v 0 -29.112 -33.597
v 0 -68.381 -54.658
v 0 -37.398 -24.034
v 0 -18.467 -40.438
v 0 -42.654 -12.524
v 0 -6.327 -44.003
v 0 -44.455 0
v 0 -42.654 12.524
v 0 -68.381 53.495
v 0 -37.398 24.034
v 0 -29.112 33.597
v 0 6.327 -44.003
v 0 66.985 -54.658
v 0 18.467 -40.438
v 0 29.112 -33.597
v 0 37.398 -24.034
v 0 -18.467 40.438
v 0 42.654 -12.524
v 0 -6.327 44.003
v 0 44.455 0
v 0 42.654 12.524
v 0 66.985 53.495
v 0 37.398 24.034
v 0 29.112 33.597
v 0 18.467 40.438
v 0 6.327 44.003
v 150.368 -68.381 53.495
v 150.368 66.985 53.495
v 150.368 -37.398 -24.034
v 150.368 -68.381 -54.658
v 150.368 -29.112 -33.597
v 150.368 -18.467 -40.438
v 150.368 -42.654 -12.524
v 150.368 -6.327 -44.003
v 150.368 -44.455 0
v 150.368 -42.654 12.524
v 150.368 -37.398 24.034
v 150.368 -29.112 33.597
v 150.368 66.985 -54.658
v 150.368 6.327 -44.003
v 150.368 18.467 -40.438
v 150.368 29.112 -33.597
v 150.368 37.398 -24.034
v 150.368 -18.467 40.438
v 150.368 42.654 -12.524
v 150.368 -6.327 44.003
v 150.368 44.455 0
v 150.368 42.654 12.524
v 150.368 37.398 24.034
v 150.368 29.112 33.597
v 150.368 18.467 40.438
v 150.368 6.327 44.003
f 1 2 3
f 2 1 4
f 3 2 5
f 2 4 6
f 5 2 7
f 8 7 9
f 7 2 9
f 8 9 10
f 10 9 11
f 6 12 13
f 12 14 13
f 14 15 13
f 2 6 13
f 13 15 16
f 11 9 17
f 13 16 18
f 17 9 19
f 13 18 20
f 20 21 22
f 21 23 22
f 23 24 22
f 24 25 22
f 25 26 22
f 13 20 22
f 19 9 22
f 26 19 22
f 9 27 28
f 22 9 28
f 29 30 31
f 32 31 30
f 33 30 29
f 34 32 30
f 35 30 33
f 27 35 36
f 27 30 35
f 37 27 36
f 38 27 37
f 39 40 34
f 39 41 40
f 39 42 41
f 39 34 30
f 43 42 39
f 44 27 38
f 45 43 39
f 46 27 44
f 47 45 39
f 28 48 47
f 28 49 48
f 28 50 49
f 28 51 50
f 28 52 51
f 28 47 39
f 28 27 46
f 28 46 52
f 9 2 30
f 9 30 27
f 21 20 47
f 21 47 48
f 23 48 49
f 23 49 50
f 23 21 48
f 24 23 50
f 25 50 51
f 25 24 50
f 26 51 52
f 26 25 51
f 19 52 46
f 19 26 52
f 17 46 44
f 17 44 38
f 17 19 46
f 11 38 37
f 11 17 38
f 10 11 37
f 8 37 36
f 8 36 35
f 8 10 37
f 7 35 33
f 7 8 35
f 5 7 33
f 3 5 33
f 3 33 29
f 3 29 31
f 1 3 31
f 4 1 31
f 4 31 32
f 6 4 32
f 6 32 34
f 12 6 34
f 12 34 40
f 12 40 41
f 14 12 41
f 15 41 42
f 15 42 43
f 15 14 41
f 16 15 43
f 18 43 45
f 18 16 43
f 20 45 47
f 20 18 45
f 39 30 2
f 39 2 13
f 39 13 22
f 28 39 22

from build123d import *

# Parameters (mm, degrees)
F0_W     = 135.365754
F0_H     = 108.153057
F0_R     = 44.4552
F1_DEPTH = 150.368


with BuildPart() as f1:
    # F0 (on Right) → F1 (new body)
    with BuildSketch(Plane.YZ):
        with Locations((-0.697762, -0.581467)):
            Rectangle(F0_W, F0_H)
        Circle(F0_R, mode=Mode.SUBTRACT)
    extrude(amount=F1_DEPTH)


solid = f1.part
